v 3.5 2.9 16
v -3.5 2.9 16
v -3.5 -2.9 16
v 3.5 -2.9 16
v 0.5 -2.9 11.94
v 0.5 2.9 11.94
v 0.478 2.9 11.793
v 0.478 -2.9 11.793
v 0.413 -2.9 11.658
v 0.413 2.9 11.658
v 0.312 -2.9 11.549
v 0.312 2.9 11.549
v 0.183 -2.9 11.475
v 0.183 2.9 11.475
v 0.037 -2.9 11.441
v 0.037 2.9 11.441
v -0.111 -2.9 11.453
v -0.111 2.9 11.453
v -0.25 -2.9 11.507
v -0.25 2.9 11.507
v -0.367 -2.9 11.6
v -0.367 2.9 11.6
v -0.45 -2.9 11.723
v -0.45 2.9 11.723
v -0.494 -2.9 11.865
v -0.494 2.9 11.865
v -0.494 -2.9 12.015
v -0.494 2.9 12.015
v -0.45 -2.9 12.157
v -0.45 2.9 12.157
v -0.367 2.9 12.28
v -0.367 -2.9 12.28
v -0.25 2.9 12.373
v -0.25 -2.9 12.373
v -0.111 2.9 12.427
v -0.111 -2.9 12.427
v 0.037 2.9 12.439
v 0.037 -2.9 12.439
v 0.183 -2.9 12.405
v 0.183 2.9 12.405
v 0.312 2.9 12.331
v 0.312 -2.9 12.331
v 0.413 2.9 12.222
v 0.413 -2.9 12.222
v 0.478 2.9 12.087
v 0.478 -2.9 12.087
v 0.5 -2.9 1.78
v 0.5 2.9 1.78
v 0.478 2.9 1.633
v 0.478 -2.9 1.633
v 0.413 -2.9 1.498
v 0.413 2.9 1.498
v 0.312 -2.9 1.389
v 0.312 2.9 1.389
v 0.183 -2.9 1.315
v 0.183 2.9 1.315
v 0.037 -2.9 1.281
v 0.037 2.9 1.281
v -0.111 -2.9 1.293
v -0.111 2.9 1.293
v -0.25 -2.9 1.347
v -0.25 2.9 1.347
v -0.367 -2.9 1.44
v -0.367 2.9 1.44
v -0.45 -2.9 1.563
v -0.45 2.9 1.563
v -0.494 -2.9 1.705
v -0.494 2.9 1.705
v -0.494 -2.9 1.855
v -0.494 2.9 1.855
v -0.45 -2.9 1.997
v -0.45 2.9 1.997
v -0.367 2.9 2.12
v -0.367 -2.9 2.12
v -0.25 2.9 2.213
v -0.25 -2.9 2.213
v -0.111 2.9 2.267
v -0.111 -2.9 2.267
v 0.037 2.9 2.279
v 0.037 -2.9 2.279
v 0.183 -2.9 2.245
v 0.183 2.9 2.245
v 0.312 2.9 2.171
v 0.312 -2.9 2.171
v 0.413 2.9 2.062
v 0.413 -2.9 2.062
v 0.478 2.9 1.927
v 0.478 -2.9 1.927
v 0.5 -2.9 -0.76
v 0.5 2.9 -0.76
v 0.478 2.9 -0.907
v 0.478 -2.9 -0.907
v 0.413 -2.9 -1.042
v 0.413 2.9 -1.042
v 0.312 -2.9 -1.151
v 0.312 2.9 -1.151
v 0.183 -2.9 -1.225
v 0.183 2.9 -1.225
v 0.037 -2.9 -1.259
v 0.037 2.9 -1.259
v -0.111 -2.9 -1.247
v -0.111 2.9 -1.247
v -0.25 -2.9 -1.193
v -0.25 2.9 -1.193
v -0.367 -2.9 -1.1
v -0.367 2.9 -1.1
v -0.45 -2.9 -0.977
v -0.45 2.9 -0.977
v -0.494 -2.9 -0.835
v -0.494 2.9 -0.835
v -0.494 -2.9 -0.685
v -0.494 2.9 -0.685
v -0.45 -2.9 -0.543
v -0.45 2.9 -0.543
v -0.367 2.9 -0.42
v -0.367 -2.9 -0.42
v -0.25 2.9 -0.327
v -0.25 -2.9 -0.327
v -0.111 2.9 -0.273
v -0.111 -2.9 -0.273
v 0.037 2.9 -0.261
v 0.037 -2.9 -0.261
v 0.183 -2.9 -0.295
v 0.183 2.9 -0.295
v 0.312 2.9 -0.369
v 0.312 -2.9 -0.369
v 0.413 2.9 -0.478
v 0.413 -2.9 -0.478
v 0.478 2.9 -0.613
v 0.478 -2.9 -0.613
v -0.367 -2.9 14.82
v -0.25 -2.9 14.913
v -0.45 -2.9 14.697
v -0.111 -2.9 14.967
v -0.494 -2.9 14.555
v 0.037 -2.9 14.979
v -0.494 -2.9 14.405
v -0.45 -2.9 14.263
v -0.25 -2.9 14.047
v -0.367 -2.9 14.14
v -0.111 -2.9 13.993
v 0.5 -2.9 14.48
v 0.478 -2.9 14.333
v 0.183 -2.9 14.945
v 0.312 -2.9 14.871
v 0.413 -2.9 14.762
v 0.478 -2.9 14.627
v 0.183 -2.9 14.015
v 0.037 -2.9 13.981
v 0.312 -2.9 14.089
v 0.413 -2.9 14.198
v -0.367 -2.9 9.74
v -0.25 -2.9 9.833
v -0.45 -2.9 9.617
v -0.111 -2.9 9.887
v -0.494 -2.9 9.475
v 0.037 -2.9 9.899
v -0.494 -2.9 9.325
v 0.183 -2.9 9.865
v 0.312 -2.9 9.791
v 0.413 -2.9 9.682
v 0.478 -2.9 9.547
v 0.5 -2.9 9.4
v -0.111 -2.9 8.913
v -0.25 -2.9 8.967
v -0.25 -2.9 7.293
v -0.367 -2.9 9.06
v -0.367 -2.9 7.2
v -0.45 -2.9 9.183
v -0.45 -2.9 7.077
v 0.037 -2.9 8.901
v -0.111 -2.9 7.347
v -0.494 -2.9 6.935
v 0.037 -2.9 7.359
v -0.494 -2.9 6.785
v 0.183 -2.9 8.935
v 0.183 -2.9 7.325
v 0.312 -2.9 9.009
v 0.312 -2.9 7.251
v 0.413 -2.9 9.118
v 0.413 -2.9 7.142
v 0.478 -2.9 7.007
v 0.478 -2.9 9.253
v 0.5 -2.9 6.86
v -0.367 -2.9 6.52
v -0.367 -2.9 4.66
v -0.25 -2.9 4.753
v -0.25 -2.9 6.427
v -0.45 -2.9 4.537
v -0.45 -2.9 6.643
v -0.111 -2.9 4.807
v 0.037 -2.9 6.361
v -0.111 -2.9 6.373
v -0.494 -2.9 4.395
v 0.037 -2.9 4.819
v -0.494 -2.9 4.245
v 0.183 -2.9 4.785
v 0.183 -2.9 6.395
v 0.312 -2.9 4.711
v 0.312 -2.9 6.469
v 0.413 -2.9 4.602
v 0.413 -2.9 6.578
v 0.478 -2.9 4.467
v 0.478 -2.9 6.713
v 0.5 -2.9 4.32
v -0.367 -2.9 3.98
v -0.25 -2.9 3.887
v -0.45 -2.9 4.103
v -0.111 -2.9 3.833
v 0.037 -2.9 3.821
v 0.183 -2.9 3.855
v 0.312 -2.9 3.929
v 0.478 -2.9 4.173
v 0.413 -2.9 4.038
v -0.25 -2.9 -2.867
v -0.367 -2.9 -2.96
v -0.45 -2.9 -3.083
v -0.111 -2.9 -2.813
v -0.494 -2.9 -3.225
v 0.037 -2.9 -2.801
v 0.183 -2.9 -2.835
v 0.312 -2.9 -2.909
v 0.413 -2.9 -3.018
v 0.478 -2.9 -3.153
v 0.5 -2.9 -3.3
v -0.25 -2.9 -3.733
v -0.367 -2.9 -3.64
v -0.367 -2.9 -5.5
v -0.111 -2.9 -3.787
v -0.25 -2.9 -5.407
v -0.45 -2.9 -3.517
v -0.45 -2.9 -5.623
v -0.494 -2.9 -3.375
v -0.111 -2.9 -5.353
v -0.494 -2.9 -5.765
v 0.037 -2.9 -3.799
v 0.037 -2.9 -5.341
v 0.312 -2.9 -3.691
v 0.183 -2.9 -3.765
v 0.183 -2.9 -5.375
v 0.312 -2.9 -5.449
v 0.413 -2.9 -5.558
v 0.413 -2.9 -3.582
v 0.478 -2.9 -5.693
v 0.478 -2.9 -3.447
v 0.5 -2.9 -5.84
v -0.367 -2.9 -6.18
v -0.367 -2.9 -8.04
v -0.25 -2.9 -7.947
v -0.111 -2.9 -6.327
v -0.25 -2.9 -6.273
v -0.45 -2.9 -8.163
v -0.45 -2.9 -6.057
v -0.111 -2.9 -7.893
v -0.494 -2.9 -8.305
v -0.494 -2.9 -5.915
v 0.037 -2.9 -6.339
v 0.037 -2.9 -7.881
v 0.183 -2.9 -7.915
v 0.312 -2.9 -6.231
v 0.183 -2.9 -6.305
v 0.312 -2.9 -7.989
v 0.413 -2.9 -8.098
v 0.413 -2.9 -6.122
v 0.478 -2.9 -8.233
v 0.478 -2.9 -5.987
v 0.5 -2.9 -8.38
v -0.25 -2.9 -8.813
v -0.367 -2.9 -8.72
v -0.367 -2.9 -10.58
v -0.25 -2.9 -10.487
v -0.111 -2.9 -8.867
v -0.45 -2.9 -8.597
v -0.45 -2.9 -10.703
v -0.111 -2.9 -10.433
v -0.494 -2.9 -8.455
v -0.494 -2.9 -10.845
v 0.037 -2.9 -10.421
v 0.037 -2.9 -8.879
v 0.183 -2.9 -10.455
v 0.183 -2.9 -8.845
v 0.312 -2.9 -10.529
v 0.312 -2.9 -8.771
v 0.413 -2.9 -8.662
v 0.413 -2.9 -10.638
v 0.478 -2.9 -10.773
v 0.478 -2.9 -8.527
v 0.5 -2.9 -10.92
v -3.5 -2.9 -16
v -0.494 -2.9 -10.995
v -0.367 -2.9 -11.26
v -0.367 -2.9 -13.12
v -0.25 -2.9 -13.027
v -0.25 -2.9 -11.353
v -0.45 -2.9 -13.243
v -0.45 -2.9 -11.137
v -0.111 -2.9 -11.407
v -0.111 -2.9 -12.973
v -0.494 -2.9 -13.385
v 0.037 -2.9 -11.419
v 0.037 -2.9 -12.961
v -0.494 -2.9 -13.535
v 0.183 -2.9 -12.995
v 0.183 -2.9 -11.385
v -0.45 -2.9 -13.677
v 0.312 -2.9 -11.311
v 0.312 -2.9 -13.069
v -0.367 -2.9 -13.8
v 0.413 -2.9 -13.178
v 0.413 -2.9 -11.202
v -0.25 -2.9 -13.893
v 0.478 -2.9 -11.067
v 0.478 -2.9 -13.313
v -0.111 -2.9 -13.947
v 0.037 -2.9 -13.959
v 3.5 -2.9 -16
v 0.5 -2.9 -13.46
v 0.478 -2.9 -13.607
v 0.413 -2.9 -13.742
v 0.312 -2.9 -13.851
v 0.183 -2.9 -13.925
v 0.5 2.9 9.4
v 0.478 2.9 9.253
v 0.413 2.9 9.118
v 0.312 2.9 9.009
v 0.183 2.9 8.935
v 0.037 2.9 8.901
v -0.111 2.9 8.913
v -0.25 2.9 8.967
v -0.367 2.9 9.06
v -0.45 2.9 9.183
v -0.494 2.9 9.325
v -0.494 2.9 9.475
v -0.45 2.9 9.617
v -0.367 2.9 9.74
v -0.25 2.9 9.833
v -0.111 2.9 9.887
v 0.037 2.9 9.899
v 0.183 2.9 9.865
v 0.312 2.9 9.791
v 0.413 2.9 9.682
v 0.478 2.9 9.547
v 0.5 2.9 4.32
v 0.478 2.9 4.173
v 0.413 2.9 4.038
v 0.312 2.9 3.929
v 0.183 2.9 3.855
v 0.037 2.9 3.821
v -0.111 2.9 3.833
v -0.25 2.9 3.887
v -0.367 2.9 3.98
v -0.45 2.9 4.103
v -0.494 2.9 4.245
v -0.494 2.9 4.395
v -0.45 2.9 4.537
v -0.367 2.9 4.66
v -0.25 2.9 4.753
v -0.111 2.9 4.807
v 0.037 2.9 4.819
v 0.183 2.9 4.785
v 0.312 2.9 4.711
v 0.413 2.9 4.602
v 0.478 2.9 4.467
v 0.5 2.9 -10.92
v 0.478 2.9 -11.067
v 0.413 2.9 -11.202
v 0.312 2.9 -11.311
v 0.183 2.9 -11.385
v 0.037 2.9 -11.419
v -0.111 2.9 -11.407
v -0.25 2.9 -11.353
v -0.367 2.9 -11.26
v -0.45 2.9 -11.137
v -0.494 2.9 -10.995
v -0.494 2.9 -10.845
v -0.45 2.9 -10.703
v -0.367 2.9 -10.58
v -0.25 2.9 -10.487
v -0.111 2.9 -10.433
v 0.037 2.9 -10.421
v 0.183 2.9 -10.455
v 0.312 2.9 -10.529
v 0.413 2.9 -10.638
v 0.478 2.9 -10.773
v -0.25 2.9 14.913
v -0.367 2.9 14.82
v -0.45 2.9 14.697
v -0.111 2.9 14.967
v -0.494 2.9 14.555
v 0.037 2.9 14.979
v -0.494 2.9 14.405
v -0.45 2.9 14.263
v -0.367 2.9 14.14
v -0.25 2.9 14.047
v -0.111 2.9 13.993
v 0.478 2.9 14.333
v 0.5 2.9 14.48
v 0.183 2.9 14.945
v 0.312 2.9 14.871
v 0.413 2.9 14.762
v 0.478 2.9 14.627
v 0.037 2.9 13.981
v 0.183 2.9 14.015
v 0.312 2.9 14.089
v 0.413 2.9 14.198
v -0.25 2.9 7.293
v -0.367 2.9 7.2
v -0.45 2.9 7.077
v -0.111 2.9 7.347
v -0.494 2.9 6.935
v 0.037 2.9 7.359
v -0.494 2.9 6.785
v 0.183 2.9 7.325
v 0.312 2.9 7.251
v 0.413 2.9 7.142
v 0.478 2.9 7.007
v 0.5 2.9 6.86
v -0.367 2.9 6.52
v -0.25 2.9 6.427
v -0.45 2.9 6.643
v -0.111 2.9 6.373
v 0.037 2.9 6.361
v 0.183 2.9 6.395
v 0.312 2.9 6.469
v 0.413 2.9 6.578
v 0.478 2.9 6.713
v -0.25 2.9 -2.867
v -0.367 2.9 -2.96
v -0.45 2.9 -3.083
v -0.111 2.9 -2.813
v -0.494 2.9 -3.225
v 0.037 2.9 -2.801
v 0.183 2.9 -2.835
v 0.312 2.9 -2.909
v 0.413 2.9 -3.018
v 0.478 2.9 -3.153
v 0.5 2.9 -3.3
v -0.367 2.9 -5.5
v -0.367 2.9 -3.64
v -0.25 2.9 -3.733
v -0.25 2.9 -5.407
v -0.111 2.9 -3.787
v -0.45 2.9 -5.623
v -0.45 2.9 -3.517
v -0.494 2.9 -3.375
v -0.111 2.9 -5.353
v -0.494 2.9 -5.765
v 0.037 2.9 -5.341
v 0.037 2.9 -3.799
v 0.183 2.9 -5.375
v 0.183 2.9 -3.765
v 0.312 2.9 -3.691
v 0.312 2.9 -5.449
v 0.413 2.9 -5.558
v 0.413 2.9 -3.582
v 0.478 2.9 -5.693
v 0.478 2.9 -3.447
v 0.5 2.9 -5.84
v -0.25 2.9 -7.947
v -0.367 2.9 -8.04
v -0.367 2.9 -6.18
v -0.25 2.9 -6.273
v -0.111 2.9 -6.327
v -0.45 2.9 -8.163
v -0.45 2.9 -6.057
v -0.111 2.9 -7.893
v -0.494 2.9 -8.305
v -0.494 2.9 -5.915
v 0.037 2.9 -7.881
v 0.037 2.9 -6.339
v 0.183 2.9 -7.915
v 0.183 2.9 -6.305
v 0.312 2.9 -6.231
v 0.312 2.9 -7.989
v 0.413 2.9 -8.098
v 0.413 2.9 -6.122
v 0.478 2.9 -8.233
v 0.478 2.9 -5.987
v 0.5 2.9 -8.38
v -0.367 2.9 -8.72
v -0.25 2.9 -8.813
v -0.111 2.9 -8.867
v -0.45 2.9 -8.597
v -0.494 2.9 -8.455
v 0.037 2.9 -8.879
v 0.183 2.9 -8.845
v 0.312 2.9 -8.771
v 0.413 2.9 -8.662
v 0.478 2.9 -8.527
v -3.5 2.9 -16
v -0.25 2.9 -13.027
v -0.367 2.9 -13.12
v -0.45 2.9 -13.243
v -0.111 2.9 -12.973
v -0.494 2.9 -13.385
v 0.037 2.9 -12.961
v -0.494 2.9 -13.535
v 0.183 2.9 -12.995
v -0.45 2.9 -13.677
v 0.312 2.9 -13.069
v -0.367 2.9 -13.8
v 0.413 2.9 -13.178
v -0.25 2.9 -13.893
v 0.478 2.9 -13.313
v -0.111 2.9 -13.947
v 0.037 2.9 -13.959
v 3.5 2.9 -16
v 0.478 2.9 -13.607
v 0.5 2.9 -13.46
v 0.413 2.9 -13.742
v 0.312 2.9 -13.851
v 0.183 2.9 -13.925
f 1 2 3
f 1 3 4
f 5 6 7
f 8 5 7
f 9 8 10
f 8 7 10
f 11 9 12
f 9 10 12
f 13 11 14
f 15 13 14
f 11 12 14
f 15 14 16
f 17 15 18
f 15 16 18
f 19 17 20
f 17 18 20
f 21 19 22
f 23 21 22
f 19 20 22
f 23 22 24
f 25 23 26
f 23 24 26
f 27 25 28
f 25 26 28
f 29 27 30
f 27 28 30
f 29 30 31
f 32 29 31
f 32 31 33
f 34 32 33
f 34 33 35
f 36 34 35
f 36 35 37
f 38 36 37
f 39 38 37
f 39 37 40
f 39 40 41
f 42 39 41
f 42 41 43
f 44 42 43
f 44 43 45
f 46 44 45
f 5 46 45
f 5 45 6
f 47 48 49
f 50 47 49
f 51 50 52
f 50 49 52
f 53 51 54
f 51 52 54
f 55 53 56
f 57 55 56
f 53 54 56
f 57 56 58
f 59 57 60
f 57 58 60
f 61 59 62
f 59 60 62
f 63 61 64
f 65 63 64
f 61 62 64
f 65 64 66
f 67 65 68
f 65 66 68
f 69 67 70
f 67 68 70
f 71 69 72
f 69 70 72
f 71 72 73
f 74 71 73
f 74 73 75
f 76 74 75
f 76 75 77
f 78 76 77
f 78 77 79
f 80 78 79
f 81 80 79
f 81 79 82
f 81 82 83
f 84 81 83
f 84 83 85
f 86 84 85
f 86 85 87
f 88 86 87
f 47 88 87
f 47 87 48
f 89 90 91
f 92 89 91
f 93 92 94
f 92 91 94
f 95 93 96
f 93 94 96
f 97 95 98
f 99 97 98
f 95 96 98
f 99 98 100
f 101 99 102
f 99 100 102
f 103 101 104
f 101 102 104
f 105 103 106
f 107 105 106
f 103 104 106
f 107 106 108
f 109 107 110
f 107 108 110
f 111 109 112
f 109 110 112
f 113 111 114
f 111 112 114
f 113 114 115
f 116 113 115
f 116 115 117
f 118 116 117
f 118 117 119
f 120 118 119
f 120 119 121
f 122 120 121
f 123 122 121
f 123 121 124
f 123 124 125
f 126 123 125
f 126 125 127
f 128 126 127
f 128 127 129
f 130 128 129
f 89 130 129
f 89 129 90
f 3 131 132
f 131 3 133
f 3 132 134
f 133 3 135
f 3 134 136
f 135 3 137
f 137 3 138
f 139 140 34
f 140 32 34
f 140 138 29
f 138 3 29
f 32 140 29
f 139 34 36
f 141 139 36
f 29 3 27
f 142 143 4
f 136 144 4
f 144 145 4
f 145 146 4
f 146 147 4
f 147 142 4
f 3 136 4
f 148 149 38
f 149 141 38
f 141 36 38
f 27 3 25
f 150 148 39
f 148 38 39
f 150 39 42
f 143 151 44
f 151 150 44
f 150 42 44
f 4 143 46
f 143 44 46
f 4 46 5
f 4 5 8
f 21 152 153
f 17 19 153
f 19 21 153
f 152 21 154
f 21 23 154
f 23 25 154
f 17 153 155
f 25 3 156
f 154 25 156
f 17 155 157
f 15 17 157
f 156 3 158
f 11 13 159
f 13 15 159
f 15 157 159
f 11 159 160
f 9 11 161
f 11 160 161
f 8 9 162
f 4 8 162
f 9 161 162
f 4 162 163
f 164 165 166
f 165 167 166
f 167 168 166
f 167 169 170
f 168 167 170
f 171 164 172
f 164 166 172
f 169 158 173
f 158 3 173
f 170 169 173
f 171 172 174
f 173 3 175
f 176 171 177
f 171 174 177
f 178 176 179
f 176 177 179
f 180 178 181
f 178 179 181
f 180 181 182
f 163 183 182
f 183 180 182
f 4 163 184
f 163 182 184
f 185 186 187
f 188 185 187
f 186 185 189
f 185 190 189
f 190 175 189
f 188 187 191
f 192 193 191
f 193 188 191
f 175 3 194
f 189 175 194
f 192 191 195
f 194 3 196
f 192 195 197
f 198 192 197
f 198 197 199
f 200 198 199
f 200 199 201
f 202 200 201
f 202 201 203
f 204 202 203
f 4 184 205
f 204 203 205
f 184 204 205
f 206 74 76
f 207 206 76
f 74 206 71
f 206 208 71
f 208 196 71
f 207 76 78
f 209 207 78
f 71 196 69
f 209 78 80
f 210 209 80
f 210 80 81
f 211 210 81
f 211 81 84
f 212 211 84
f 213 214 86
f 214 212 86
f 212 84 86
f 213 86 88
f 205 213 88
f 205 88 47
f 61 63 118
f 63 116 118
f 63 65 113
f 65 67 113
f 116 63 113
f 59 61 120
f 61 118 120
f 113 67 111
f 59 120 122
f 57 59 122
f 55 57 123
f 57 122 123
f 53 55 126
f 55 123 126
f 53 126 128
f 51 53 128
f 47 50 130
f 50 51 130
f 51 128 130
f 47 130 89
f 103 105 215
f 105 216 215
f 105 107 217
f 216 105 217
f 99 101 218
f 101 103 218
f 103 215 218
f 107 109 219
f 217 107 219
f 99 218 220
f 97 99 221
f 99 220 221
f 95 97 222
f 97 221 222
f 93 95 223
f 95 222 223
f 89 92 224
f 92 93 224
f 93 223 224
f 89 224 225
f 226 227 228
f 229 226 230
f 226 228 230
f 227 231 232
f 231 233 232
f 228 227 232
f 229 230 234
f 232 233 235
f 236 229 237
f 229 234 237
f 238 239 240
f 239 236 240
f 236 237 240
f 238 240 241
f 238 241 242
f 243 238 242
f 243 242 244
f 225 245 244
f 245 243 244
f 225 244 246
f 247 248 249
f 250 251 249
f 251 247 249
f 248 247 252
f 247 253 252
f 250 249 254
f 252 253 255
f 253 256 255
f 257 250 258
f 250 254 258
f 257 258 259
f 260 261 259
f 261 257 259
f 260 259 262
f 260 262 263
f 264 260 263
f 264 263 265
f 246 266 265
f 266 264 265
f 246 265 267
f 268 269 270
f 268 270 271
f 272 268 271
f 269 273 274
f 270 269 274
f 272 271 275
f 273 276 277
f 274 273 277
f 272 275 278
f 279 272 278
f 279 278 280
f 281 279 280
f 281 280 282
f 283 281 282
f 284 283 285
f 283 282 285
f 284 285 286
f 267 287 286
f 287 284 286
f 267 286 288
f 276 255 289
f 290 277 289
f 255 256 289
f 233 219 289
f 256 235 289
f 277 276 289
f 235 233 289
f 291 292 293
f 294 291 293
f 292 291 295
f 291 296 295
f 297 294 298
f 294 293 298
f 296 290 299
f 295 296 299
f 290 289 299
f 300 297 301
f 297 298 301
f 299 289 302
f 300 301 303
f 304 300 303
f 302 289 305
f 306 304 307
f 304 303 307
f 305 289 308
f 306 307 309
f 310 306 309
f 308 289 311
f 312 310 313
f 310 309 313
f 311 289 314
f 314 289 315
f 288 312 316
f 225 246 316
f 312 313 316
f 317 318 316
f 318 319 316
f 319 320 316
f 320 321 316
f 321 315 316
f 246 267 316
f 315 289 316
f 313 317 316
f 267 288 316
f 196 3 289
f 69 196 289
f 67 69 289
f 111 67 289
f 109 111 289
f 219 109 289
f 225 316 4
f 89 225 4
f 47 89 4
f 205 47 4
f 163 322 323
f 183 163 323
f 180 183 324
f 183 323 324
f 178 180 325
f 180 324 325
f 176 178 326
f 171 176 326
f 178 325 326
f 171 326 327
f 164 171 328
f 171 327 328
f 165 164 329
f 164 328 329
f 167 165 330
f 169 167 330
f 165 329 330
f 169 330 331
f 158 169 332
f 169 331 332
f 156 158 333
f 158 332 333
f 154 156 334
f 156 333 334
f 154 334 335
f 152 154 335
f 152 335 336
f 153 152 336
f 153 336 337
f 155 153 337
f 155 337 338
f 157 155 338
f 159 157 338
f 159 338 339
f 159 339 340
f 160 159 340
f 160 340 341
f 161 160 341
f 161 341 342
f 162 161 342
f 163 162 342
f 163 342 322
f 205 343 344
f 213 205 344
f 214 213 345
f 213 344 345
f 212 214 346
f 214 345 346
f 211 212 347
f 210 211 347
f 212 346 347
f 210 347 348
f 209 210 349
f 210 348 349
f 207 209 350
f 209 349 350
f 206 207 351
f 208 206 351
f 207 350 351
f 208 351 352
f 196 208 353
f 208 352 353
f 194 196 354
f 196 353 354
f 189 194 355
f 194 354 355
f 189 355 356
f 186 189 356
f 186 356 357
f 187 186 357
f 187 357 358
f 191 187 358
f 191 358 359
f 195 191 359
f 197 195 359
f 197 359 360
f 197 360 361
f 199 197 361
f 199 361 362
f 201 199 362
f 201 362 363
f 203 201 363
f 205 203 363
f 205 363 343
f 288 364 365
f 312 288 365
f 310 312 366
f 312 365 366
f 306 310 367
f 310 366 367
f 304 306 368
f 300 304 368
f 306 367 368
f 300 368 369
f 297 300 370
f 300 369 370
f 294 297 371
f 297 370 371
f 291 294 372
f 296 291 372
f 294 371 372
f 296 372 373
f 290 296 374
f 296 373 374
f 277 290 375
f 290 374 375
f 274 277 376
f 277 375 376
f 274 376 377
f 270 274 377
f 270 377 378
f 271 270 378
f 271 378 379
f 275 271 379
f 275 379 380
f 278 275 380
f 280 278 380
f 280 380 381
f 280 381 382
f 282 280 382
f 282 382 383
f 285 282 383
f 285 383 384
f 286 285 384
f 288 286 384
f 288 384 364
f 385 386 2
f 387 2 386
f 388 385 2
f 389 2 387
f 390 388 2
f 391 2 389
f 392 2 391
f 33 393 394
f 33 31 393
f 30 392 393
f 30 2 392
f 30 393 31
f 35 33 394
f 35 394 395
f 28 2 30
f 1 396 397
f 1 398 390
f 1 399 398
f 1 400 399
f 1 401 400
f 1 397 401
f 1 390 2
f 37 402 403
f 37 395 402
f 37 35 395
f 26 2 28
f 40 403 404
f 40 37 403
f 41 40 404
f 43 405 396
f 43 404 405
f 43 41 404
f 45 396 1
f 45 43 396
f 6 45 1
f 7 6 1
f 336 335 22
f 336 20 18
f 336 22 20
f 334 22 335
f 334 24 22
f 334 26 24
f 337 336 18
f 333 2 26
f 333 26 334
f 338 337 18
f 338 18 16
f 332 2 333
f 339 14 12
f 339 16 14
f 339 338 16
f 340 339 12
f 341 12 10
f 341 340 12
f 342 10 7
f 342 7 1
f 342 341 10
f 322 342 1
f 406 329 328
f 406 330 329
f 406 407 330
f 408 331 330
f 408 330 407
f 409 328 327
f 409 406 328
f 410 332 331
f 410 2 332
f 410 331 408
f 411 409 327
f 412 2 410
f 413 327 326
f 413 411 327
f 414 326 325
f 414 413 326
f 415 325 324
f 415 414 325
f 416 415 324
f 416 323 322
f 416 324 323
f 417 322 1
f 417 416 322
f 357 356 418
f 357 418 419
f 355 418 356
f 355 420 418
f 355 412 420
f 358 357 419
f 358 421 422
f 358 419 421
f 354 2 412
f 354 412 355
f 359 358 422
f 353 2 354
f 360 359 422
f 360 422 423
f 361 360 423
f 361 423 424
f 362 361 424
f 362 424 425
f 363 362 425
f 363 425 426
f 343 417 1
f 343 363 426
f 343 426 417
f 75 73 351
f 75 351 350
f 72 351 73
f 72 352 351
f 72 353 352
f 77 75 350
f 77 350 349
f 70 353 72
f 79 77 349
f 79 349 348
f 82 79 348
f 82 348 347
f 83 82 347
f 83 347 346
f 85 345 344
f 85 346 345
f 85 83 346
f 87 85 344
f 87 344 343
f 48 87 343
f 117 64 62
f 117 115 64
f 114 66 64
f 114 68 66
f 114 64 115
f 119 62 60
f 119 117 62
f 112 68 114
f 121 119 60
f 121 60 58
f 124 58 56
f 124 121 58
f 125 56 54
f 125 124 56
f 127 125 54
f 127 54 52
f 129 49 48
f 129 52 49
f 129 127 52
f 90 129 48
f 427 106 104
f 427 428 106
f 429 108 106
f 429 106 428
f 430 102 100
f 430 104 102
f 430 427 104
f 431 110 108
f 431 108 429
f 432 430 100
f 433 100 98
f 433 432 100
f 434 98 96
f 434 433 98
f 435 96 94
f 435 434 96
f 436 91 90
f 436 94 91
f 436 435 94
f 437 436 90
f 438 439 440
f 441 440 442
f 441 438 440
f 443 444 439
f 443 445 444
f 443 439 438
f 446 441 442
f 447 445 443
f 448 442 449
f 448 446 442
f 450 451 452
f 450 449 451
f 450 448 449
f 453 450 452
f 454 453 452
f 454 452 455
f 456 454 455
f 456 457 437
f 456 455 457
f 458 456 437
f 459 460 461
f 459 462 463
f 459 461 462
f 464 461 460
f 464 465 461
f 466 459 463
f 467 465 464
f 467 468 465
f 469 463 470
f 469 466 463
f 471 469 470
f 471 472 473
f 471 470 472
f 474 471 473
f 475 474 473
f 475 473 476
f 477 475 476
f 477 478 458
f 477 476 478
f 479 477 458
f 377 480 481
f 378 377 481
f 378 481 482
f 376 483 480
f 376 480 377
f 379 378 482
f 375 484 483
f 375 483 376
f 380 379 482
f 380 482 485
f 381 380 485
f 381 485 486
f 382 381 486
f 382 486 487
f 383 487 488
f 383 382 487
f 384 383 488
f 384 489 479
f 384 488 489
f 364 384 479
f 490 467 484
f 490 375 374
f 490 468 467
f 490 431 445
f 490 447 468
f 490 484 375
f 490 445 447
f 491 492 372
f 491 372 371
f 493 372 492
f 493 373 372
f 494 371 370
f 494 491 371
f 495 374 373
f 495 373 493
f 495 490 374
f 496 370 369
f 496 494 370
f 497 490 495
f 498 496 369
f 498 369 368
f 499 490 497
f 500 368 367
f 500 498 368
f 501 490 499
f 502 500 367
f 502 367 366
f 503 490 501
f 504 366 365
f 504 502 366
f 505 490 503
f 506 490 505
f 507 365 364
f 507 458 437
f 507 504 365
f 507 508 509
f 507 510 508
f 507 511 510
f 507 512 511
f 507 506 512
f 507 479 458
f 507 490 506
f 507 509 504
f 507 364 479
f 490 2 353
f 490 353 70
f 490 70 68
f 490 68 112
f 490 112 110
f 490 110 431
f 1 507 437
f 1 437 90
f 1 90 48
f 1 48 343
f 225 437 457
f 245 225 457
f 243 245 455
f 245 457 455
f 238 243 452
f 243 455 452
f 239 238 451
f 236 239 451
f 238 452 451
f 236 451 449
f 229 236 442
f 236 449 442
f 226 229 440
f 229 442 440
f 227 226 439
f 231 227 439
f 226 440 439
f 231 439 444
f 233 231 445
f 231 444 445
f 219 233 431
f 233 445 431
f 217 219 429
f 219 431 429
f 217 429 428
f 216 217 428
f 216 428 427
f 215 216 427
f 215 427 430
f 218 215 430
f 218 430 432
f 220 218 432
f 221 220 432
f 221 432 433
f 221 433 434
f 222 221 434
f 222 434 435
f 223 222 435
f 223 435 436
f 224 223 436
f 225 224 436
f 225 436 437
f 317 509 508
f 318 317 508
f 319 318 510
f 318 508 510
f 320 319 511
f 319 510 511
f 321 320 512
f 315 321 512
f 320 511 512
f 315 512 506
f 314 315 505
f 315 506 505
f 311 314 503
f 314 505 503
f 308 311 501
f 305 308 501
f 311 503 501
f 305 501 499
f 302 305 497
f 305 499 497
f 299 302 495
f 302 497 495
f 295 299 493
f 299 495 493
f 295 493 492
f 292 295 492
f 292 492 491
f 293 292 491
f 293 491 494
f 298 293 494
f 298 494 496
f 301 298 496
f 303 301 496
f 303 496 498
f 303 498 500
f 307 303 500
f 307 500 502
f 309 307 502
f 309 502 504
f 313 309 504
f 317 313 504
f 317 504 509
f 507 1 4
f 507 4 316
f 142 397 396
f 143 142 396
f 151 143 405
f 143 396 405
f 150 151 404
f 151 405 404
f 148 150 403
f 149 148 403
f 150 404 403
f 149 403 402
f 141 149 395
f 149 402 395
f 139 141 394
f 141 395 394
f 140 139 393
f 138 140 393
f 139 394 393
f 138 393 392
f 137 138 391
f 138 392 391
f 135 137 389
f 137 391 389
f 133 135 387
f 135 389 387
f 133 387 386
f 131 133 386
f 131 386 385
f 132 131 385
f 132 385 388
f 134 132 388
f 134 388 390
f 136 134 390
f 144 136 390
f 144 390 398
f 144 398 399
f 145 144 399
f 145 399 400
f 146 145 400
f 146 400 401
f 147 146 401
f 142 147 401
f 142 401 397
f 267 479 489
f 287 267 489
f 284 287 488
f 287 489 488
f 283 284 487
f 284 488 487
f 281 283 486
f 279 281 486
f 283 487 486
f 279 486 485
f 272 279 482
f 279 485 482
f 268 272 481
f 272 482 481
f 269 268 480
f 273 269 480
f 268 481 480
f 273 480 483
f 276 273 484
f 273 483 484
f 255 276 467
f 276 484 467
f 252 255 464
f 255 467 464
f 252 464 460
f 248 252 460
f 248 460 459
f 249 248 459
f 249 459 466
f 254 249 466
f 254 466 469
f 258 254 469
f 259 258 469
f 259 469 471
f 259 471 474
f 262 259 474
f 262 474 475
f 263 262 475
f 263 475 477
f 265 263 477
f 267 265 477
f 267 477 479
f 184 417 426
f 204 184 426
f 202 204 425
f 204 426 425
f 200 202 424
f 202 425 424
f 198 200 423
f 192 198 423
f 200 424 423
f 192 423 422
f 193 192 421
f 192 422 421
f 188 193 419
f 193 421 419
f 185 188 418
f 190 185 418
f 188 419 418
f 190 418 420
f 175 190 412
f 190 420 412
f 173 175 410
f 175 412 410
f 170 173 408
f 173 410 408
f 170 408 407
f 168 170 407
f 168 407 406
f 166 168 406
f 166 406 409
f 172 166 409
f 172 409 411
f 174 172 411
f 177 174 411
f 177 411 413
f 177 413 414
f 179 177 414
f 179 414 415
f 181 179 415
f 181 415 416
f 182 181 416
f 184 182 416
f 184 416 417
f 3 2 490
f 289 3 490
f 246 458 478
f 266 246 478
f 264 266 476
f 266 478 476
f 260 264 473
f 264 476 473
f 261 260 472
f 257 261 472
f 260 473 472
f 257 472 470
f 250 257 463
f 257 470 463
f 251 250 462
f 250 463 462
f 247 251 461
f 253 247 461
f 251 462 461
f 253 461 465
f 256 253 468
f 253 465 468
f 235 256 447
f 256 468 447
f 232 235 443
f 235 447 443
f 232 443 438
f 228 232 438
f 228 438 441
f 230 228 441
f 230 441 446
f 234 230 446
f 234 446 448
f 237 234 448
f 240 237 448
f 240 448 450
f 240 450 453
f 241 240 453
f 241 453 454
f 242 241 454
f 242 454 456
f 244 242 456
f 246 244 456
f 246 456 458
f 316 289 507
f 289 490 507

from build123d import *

# Parameters (mm, degrees)
SKETCH1_W           = 7
SKETCH1_H           = 32
BOSS_EXTRUDE1_DEPTH = 2.9
SKETCH2_R           = 0.5
CUT_EXTRUDE1_DEPTH  = 6.8
LPATTERN1_COUNT     = 12
LPATTERN1_PITCH     = 2.54


with BuildPart() as part:
    # Sketch1 → Boss-Extrude1 (new body, symmetric)
    with BuildSketch(Plane(origin=(0, 0, 0), x_dir=(1, 0, 0), z_dir=(0, 1, 0))):
        Rectangle(SKETCH1_W, SKETCH1_H)
    extrude(amount=BOSS_EXTRUDE1_DEPTH, both=True)

    # Sketch2 → Cut-Extrude1 (cut, through all)
    with BuildSketch(Plane(origin=(0, 2.9, 0), x_dir=(1, 0, 0), z_dir=(0, 1, 0))):
        with Locations((0, 13.46)):
            Circle(SKETCH2_R)
    cut_extrude1 = extrude(amount=-CUT_EXTRUDE1_DEPTH, mode=Mode.SUBTRACT)

    # LPattern1: Cut-Extrude1 ×12
    with Locations(*[(0, 0, i * LPATTERN1_PITCH) for i in range(1, LPATTERN1_COUNT)]):
        add(cut_extrude1, mode=Mode.SUBTRACT)


solid = part.part
